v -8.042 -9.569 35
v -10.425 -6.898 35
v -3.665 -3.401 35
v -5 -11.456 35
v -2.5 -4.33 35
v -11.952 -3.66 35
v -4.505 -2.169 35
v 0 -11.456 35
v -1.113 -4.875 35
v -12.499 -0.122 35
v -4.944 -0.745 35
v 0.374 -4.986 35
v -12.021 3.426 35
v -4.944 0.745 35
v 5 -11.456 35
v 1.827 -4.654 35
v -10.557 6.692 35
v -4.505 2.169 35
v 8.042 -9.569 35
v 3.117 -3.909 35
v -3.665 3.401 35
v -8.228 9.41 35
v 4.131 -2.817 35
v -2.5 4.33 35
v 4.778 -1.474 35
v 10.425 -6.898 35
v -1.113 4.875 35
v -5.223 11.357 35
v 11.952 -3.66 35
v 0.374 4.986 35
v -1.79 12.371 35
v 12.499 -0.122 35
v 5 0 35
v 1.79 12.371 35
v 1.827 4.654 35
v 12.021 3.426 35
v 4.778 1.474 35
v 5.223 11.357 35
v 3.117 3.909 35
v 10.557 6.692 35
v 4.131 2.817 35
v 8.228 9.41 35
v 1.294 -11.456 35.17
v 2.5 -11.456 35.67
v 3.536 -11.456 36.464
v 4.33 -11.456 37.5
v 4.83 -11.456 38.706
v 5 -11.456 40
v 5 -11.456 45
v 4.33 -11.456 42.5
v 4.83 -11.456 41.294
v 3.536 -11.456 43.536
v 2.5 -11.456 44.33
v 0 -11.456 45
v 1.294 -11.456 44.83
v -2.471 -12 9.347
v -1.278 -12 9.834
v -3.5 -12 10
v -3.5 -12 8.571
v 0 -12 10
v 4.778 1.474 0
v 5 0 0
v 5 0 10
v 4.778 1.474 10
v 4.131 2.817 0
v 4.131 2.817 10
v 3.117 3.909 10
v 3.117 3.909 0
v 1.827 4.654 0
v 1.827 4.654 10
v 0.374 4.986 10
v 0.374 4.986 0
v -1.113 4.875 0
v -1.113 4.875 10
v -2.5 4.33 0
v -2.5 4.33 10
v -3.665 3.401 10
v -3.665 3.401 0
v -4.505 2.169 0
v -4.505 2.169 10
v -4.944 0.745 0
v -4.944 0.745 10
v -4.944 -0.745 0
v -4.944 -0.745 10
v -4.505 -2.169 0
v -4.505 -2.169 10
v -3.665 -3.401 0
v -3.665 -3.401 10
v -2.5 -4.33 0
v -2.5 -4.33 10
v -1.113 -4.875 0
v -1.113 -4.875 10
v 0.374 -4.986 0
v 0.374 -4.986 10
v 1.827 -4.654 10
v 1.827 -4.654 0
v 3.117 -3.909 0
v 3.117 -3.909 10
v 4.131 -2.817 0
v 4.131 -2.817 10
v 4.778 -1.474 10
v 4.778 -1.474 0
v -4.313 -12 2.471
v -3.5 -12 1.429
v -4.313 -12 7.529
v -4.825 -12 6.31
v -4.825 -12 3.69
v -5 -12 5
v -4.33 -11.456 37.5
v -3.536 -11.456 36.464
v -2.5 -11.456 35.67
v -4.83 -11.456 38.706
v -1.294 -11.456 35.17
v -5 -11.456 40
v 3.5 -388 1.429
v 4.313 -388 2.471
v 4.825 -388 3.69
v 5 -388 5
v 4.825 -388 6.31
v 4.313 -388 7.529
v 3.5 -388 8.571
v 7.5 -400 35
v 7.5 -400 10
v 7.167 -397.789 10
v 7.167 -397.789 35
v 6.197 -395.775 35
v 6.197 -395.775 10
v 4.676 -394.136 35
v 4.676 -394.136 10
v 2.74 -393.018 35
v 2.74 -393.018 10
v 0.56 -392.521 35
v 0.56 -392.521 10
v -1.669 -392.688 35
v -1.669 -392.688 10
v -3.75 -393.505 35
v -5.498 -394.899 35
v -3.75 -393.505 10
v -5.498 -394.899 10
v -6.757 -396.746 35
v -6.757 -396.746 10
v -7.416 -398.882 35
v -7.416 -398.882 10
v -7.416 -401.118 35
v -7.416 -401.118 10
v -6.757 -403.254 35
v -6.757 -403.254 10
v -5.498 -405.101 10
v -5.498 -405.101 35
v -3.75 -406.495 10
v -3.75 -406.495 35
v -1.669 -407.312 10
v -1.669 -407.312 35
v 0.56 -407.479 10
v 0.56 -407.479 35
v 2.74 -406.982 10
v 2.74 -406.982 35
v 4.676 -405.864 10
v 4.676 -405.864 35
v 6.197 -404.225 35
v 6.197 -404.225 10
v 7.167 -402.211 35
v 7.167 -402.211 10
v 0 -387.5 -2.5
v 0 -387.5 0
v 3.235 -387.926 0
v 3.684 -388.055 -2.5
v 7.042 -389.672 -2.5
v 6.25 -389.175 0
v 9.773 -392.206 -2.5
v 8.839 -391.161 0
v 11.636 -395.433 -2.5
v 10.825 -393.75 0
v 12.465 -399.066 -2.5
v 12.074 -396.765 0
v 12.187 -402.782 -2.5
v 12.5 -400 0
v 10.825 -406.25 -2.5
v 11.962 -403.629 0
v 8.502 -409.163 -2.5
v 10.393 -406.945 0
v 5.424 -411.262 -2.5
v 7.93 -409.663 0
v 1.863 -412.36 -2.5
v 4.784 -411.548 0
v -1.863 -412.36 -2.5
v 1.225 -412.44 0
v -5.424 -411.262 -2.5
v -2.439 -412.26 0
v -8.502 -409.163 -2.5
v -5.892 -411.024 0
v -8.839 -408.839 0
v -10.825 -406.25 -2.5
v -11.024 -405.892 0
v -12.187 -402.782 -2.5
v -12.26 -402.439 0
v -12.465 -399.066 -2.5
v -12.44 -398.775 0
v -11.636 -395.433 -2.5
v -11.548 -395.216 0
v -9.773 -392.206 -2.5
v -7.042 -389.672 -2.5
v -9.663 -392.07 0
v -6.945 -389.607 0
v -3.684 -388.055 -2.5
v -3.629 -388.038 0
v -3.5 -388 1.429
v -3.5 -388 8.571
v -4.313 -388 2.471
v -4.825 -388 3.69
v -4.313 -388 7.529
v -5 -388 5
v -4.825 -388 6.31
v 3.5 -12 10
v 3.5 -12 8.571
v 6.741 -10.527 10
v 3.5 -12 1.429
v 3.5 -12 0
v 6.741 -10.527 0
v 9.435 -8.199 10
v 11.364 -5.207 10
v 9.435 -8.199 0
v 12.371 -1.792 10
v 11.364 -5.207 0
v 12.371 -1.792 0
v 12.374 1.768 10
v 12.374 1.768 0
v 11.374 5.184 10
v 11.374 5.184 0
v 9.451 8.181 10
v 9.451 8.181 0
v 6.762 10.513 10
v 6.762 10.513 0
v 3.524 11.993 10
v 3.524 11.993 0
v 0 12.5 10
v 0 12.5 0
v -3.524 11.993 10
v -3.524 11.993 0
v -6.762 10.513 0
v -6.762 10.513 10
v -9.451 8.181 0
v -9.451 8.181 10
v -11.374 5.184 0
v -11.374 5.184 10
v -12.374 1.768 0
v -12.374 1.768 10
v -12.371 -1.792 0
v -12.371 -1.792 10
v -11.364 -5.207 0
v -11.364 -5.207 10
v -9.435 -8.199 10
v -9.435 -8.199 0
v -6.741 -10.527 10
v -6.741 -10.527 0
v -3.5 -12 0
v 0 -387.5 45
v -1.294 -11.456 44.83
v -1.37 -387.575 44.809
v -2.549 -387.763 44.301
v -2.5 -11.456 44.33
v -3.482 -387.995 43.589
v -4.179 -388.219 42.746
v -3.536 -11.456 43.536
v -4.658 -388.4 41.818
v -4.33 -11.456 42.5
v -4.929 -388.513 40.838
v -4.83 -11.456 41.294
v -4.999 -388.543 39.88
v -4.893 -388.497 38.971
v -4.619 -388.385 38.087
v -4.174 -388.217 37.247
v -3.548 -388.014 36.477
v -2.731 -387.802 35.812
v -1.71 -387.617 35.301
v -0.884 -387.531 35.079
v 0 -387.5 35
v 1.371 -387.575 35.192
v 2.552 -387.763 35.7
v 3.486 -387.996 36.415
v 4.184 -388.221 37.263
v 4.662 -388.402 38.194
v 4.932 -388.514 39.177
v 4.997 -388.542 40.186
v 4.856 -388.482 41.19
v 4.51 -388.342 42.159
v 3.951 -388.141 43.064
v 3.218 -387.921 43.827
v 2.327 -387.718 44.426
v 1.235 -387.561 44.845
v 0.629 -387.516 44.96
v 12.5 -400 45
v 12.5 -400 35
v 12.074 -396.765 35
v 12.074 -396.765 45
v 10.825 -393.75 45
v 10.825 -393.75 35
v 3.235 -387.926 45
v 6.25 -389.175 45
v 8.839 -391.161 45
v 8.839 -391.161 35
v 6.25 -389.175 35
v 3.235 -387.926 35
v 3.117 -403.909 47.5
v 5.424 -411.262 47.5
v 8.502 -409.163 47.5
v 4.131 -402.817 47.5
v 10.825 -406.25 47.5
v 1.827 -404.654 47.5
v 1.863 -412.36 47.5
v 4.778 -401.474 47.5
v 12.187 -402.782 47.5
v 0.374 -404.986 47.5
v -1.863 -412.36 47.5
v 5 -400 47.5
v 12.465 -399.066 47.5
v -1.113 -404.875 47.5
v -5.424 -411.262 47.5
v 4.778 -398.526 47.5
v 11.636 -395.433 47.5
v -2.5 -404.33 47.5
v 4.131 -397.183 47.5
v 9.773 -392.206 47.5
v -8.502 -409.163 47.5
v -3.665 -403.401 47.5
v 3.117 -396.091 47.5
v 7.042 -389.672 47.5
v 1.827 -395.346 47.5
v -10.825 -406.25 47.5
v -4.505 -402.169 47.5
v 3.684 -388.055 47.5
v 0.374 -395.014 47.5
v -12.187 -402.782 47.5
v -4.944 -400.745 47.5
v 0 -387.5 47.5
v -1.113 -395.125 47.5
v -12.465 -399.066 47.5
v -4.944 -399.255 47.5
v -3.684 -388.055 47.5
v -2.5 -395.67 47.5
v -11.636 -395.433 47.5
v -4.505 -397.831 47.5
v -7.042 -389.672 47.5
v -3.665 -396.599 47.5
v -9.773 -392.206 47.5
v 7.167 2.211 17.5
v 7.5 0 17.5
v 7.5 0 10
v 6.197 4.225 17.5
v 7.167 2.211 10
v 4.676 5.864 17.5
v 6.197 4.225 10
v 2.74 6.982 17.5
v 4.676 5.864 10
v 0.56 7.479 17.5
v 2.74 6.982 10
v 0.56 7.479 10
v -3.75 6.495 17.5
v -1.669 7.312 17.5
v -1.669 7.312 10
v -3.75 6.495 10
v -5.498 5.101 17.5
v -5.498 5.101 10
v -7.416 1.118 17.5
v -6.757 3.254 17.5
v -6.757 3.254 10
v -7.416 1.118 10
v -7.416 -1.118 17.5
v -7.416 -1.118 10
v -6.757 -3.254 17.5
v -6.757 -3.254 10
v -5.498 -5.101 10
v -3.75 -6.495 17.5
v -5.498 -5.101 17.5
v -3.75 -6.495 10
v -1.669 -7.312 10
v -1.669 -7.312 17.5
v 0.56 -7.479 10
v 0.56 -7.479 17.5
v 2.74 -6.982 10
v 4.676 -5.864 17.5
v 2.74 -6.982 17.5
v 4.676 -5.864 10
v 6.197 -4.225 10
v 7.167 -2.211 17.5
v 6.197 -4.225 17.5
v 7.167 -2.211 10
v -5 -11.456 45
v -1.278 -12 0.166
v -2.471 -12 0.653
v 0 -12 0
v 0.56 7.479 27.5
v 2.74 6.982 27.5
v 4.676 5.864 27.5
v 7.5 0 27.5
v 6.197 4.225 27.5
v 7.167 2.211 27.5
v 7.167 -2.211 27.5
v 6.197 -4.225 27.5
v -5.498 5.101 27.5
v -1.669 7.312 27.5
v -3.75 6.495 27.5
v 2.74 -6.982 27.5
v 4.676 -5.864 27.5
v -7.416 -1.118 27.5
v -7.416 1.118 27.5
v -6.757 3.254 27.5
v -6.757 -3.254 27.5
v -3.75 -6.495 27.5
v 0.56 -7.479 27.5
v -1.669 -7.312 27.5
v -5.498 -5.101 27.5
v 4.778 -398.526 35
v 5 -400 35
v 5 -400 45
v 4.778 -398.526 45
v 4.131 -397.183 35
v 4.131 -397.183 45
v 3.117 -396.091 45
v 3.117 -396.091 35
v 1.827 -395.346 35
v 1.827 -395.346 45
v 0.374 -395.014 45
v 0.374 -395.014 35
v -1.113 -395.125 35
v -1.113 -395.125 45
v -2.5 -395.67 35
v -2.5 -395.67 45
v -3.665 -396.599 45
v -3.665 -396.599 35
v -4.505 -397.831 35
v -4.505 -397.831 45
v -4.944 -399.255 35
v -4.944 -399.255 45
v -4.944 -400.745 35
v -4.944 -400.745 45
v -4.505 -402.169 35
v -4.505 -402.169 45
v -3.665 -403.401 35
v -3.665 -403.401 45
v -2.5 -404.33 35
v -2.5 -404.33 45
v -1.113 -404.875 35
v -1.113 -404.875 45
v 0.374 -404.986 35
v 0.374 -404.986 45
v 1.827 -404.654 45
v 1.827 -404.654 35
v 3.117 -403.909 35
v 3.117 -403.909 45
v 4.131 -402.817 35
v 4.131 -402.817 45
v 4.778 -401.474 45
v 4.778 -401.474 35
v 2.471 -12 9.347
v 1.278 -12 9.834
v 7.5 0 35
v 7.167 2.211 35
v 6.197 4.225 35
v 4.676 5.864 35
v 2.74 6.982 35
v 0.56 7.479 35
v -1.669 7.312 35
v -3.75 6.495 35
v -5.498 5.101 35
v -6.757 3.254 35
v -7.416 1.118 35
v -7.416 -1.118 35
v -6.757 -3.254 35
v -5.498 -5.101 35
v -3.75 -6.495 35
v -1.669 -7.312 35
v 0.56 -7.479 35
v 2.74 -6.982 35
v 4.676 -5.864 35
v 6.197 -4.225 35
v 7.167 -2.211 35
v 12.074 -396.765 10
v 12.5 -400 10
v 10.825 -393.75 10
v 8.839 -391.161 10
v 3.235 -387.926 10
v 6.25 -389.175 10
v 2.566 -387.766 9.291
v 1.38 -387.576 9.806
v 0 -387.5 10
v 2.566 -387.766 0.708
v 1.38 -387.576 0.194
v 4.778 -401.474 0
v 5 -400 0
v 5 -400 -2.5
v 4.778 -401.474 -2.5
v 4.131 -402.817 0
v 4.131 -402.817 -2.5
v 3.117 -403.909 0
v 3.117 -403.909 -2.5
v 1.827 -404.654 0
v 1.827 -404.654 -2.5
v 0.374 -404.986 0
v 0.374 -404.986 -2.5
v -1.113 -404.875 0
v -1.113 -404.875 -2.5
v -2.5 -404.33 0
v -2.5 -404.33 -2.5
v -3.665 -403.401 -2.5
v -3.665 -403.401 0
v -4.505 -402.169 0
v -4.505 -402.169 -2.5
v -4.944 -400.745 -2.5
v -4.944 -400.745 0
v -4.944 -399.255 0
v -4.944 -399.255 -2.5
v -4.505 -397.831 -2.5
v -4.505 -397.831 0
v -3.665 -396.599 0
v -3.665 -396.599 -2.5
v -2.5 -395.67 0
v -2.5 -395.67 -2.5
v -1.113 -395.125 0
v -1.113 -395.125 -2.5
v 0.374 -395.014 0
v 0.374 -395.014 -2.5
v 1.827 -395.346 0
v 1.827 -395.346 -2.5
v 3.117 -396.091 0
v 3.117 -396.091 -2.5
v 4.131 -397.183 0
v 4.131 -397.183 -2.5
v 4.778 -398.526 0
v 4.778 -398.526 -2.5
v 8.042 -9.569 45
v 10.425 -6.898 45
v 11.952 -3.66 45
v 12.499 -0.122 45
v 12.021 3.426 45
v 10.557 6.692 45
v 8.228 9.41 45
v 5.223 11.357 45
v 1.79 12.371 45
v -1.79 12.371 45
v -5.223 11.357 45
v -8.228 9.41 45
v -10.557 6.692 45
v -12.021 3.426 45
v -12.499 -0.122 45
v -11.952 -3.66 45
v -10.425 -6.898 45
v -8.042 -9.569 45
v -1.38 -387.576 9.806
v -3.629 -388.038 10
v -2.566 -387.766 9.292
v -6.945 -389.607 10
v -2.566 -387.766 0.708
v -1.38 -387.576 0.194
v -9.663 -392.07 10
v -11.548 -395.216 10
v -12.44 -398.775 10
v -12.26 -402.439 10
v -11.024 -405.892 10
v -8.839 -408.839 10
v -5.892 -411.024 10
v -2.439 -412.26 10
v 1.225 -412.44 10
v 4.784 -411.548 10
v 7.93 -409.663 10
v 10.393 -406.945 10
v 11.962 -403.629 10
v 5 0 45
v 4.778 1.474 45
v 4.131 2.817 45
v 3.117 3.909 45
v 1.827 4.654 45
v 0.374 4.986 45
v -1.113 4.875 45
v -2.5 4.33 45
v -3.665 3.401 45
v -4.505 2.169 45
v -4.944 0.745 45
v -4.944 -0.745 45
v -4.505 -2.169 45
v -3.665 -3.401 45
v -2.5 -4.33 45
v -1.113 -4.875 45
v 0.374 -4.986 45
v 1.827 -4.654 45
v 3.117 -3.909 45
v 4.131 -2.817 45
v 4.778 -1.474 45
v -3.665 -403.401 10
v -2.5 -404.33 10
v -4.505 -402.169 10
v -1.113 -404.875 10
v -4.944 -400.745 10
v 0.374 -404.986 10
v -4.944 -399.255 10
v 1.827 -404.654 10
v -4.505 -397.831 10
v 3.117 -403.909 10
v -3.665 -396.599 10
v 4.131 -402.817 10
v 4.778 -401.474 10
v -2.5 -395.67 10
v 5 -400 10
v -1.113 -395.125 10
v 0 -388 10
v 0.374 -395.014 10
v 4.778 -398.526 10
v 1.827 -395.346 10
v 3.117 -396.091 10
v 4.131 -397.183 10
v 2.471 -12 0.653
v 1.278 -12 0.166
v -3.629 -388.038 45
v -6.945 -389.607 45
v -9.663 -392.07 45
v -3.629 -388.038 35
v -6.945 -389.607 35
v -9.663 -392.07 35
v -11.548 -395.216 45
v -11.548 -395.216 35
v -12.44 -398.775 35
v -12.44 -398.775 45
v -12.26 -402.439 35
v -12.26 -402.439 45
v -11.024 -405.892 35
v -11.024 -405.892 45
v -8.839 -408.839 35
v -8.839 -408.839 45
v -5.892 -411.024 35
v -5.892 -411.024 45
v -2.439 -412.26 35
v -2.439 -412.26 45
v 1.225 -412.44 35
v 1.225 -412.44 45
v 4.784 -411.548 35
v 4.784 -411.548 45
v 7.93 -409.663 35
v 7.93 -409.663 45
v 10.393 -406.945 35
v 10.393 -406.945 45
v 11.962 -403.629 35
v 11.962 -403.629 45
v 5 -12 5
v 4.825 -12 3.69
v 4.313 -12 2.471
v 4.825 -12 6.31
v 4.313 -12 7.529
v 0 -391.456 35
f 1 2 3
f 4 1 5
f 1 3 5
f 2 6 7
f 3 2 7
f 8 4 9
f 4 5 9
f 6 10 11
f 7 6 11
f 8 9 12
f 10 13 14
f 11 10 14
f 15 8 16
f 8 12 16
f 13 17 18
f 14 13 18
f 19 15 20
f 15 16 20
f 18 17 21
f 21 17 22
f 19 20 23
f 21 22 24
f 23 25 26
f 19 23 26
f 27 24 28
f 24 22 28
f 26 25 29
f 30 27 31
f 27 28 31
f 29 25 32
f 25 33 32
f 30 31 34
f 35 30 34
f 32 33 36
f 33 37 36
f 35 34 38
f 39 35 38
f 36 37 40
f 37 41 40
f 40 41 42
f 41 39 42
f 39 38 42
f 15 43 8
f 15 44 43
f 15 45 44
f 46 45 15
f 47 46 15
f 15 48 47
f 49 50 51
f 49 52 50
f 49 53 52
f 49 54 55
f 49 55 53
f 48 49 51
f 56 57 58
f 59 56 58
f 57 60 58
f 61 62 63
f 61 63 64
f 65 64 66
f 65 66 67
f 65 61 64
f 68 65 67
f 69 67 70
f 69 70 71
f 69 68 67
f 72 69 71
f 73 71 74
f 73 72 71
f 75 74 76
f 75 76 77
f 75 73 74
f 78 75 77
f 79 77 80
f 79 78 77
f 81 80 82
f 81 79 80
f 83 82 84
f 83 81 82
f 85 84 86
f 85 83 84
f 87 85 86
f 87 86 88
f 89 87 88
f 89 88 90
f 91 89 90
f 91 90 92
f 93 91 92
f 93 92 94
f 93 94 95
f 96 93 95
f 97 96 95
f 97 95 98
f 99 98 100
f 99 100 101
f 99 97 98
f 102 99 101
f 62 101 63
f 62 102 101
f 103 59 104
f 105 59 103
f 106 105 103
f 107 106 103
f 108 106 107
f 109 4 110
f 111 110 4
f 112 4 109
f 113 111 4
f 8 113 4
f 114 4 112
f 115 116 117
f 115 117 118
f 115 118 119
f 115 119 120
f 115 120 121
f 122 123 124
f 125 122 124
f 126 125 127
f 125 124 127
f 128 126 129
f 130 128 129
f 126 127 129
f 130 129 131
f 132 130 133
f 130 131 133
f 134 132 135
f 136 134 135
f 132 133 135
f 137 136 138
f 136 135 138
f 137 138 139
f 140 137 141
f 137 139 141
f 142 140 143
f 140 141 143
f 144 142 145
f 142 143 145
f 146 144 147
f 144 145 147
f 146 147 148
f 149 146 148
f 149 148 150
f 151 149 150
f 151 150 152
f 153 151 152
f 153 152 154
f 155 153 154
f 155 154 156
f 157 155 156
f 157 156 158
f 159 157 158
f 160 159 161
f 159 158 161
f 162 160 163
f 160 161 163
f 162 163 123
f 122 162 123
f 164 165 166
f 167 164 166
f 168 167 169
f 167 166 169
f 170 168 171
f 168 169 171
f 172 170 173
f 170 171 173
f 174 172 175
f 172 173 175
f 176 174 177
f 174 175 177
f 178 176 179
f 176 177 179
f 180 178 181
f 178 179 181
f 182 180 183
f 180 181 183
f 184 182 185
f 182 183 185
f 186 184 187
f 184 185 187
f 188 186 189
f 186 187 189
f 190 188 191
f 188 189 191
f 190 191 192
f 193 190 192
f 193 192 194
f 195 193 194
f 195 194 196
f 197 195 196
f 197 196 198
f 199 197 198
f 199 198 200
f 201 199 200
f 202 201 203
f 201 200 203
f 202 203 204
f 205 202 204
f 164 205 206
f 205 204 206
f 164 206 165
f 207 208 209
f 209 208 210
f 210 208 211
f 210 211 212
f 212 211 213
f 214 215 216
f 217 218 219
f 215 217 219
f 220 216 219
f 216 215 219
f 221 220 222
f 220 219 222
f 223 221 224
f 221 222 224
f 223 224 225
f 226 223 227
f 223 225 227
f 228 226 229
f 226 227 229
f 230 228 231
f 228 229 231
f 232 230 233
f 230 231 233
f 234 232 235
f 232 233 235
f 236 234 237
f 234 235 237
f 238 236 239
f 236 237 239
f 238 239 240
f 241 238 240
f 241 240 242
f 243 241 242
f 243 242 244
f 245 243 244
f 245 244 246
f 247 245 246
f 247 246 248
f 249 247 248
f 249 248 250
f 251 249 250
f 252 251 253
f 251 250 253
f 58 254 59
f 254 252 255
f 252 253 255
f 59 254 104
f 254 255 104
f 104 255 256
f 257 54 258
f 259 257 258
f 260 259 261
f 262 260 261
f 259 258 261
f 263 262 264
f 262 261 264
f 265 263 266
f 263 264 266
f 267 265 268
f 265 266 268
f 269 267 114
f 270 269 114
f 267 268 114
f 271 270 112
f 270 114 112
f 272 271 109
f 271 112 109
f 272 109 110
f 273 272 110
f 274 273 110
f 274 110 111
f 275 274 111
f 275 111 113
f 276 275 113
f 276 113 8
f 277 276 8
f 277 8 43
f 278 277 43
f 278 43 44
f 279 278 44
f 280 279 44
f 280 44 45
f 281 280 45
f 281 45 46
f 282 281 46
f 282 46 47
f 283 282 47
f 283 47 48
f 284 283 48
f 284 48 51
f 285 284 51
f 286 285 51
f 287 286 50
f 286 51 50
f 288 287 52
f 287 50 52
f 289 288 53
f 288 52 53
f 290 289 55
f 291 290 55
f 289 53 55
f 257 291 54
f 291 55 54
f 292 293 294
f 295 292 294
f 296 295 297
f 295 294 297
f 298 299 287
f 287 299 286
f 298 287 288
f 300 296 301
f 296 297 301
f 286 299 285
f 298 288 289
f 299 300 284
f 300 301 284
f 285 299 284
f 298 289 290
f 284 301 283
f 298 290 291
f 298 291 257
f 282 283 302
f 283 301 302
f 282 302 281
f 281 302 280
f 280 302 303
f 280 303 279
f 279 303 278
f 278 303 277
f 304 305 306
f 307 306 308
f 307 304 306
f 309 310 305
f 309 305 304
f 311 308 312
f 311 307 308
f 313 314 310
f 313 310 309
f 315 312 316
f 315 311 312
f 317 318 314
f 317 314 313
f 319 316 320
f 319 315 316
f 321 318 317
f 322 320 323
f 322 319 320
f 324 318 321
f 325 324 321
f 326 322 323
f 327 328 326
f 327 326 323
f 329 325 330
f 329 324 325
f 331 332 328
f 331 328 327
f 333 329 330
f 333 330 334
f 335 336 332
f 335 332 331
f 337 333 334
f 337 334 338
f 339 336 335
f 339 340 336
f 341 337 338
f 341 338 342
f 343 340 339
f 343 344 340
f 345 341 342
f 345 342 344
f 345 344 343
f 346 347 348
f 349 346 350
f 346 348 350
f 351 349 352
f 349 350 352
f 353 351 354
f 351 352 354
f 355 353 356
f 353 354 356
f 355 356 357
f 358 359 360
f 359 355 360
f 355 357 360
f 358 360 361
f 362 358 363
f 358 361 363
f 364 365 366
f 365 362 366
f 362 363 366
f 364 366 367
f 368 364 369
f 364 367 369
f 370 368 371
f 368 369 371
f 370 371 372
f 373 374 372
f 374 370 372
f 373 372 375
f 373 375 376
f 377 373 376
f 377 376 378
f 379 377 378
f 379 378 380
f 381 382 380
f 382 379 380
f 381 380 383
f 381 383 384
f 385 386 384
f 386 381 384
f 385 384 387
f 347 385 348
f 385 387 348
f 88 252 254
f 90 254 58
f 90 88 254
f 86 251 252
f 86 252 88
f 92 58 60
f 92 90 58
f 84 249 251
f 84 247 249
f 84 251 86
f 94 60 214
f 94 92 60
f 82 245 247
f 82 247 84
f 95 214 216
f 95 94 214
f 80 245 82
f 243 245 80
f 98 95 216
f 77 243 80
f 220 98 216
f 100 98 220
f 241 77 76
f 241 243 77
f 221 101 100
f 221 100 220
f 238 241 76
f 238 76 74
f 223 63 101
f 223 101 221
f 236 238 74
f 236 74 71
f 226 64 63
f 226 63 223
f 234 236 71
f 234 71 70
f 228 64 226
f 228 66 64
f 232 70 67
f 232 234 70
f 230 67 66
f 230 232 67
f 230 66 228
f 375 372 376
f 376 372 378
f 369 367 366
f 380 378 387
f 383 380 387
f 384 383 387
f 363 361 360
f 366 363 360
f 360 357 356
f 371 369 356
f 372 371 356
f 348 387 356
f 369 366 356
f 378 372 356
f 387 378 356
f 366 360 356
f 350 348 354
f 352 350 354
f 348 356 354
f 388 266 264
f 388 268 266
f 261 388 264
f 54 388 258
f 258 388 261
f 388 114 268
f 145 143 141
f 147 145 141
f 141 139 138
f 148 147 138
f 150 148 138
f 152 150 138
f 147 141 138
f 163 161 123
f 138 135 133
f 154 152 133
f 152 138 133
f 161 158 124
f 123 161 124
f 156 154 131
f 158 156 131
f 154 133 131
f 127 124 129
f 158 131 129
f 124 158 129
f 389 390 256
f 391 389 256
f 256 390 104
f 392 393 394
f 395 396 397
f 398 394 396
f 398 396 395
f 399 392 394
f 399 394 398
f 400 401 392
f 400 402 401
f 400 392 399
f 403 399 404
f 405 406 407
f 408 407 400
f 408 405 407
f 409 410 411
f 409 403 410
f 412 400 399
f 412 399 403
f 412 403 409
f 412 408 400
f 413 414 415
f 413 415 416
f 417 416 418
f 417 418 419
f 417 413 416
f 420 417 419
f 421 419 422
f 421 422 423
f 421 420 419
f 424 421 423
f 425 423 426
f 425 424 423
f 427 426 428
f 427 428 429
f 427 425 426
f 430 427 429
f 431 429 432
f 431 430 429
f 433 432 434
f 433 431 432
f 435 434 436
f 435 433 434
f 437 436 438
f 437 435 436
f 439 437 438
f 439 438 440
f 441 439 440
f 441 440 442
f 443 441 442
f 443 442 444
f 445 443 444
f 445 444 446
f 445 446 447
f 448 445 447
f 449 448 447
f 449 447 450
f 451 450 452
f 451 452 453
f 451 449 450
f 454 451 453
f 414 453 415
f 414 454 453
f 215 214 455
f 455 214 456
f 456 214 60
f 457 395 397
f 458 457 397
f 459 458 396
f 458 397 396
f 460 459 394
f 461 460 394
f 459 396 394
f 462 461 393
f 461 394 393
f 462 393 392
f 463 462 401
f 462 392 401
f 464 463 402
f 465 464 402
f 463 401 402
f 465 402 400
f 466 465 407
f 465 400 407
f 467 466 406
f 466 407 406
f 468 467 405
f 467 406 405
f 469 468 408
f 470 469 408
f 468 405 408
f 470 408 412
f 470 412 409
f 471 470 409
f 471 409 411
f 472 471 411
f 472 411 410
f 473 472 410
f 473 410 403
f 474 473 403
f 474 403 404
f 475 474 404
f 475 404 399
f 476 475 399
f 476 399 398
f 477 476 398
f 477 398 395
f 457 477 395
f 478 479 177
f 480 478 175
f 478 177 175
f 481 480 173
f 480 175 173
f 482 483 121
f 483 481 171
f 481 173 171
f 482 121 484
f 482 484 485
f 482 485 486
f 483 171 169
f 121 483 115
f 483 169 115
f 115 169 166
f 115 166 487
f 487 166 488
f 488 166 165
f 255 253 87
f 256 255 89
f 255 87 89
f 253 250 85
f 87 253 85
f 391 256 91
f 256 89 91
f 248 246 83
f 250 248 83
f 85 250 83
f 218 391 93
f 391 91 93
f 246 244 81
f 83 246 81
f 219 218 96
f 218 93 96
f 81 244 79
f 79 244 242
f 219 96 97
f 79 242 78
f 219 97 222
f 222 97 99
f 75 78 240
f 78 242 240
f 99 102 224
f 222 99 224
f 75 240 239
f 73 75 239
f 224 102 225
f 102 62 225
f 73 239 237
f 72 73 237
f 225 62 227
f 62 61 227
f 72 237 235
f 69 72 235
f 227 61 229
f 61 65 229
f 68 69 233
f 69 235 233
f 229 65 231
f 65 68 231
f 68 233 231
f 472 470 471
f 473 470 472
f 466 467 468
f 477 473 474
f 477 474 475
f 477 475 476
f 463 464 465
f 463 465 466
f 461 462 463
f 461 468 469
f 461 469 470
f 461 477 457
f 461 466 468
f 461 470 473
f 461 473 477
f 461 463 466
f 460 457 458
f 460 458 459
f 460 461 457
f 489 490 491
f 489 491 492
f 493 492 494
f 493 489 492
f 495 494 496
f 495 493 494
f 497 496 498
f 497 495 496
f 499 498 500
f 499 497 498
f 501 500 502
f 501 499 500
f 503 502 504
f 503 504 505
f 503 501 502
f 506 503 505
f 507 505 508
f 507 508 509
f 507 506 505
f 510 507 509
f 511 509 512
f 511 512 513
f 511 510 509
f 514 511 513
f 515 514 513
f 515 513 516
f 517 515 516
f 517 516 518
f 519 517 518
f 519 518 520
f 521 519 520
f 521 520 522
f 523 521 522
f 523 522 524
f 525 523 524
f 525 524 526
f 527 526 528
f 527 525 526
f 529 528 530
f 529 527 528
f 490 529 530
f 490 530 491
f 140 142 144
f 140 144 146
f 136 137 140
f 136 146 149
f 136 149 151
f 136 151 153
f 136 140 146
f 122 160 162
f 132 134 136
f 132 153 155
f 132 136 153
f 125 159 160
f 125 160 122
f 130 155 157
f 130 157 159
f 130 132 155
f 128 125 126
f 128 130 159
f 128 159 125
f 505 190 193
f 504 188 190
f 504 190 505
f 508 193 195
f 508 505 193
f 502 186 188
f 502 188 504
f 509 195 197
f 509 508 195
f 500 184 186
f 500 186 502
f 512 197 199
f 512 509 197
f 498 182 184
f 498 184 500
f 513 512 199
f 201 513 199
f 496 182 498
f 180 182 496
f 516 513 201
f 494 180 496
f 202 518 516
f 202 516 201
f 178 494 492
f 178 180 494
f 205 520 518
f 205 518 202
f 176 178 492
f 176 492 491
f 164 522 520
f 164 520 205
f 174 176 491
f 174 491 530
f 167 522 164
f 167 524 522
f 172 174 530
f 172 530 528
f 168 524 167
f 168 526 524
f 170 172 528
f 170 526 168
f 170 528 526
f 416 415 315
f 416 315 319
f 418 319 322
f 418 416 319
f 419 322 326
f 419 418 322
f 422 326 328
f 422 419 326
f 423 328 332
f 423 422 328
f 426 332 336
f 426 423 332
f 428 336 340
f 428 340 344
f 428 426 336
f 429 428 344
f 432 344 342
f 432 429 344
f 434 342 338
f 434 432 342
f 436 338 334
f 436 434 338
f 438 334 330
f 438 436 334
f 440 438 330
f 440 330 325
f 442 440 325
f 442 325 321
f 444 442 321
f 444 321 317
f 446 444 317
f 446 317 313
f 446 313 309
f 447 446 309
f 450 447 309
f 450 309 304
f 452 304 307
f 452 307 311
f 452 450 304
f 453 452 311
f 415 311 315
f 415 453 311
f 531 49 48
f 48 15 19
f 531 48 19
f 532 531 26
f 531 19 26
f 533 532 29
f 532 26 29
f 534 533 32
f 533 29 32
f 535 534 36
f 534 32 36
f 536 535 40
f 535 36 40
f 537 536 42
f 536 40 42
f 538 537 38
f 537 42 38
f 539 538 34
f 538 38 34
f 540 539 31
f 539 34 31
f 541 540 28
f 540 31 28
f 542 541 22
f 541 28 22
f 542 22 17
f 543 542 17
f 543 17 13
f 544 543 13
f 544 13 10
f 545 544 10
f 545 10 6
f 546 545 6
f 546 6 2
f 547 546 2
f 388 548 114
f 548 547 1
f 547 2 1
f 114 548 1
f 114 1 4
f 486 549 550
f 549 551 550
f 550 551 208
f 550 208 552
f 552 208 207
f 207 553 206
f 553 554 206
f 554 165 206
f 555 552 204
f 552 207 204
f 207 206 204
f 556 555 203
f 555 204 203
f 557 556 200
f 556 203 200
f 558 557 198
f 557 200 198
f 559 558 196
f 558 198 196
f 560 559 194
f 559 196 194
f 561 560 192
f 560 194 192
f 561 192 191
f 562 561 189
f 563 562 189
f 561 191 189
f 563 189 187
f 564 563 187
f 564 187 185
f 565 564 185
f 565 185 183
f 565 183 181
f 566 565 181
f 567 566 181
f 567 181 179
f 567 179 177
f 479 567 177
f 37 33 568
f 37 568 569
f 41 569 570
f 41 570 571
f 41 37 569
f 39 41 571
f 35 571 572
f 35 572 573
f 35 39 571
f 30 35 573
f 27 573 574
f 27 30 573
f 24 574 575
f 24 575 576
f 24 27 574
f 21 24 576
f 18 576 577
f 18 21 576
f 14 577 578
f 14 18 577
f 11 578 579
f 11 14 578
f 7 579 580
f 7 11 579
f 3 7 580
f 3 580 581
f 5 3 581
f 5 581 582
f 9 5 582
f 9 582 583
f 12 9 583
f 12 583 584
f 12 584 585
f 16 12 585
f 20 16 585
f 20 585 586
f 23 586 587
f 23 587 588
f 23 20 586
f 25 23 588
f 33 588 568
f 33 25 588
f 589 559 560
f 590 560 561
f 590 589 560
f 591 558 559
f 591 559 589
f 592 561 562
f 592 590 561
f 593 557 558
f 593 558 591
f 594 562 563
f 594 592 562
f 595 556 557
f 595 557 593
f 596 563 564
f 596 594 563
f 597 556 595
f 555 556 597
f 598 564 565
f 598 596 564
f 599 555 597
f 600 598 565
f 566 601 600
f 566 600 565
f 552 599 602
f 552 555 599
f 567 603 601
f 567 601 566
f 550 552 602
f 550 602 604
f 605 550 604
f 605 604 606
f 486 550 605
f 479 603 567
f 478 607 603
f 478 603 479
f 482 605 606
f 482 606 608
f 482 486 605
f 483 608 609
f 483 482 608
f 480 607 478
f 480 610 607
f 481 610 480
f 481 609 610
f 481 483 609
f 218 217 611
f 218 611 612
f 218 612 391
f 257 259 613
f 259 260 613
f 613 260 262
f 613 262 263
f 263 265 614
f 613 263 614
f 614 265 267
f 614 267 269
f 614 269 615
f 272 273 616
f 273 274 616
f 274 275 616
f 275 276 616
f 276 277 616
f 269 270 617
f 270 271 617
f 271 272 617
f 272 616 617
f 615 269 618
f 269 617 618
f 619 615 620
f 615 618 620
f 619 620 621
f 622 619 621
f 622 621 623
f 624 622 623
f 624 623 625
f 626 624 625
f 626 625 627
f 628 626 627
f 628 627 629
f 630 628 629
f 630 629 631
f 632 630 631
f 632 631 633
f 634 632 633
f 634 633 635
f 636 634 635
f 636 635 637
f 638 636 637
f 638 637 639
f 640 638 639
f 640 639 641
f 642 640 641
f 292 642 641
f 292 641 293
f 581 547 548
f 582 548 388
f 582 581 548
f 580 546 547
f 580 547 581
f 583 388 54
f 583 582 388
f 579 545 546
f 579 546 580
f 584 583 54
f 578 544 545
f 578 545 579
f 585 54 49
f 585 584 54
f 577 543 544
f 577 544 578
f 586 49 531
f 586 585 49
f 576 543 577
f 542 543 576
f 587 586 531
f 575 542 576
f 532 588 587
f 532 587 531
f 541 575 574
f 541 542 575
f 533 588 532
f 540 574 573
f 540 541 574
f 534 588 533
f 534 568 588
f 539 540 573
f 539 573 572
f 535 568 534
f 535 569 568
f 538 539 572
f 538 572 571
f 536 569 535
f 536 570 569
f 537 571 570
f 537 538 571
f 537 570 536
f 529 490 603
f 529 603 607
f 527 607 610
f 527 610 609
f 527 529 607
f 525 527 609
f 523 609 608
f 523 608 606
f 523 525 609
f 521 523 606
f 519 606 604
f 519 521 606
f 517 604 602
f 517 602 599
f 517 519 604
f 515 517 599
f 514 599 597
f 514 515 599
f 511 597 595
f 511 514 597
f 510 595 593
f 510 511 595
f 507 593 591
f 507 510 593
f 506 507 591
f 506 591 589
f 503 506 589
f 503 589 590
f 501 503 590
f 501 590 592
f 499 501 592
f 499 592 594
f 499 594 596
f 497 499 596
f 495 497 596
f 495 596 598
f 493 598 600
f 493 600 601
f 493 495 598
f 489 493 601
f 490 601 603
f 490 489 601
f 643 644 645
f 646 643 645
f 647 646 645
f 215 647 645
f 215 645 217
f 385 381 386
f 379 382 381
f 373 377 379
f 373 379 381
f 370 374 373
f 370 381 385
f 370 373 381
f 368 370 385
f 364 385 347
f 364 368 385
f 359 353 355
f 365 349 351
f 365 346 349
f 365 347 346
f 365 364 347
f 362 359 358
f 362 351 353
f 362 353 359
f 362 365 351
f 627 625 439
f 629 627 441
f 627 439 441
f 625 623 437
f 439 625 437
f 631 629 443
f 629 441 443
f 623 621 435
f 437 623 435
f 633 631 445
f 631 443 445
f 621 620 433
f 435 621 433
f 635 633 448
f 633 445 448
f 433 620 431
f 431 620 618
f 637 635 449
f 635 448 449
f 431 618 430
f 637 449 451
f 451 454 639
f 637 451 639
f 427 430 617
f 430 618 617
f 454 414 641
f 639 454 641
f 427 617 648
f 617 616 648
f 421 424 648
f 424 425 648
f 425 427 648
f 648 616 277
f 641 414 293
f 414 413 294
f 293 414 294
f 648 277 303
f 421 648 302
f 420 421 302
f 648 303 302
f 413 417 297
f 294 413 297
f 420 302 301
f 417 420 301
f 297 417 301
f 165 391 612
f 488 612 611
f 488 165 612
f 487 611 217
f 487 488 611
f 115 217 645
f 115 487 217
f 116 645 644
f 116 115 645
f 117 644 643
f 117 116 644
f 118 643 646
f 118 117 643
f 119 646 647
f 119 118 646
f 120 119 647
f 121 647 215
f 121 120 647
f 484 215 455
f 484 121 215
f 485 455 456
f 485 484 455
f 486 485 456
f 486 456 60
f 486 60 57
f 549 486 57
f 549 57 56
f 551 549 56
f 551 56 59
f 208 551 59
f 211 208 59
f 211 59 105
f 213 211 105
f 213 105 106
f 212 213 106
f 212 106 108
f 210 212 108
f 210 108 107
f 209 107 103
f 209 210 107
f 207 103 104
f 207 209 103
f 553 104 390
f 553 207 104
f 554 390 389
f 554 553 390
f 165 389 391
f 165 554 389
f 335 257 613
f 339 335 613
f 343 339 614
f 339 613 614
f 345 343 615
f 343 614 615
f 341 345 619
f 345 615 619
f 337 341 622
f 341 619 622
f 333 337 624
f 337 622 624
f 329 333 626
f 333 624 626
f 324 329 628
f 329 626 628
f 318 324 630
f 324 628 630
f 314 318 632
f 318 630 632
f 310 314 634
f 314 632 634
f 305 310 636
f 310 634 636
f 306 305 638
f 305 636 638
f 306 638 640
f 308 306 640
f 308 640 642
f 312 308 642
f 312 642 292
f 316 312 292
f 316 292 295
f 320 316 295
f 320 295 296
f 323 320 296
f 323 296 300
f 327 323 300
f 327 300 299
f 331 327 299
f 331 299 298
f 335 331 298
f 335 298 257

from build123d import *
from build123d.topology import SkipClean

# Parameters (mm, degrees)
SKETCH1_R               = 12.5
SKETCH1_R_2             = 5
BOSS_EXTRUDE1_DEPTH     = 10
CUT_EXTRUDE2_DEPTH      = 21.310096012
SKETCH3_R               = 5
BOSS_EXTRUDE2_DEPTH     = 188
SKETCH5_R               = 12.5
SKETCH5_R_2             = 5
BOSS_EXTRUDE4_DEPTH     = 10
SKETCH7_R               = 7.5
BOSS_EXTRUDE5_DEPTH     = 25
BOSS_EXTRUDE5_2_DEPTH   = 25
SKETCH8_R               = 12.5
SKETCH8_R_2             = 5
BOSS_EXTRUDE6_DEPTH     = 10
BOSS_EXTRUDE6_2_DEPTH   = 10
CUT_EXTRUDE3_DEPTH      = 20
SKETCH12_R              = 5
BOSS_EXTRUDE8_DEPTH     = 380
CUT_EXTRUDE4_DEPTH      = 416.135520155
CUT_EXTRUDE4_DEPTH_BACK = 416.135520155
SKETCH14_R              = 12.5
SKETCH14_R_2            = 5
BOSS_EXTRUDE9_DEPTH     = 2.5
SKETCH15_R              = 12.5
SKETCH15_R_2            = 5
BOSS_EXTRUDE10_DEPTH    = 2.5


with BuildPart() as part:
    # Sketch1 → Boss-Extrude1 (new body)
    with BuildSketch(Plane.XY):
        Circle(SKETCH1_R)
        Circle(SKETCH1_R_2, mode=Mode.SUBTRACT)
    extrude(amount=BOSS_EXTRUDE1_DEPTH)

    # Sketch2 → Cut-Extrude2 (cut, through all)
    with BuildSketch(Plane.XY.offset(10)):
        with BuildLine():
            Line((9.108105184, -12), (3.5, -12))
            ThreePointArc((3.5, -12), (0, -12.5), (-3.5, -12))
            Line((-3.5, -12), (-7.494861462, -12))
            Line((-7.494861462, -12), (-7.494861462, -13.628548532))
            Line((-7.494861462, -13.628548532), (9.511416115, -13.628548532))
            Line((9.511416115, -13.628548532), (9.108105184, -12))
        make_face()
        with BuildLine():
            Line((3.5, -12), (0, -12))
            Line((0, -12), (-3.5, -12))
            ThreePointArc((-3.5, -12), (0, -12.5), (3.5, -12))
        make_face()
    extrude(amount=-CUT_EXTRUDE2_DEPTH, mode=Mode.SUBTRACT)

    # Sketch3 → Boss-Extrude2 (add)
    with BuildSketch(Plane(origin=(0, -12, 0), x_dir=(-1, 0, 0), z_dir=(0, -1, 0))):
        with Locations(Location((0, -5, 0), (0, 0, 90))):
            Circle(SKETCH3_R)
    boss_extrude2 = extrude(amount=BOSS_EXTRUDE2_DEPTH)

    # Mirror2: Boss-Extrude2 across plane
    add(boss_extrude2.mirror(Plane(origin=(0, -200, 5), x_dir=(0, 0, 1), z_dir=(0, -1, 0))))

    # Sketch5 → Boss-Extrude4 (add)
    with SkipClean():  # the faces are left unmerged after this step: merging them gives an invalid solid
        with BuildSketch(Plane.XY):
            with Locations((0, -400)):
                Circle(SKETCH5_R)
            with Locations((0, -400)):
                Circle(SKETCH5_R_2, mode=Mode.SUBTRACT)
        extrude(amount=BOSS_EXTRUDE4_DEPTH)

    # Sketch15 → Boss-Extrude10 (add)
    with SkipClean():  # the faces are left unmerged after this step: merging them gives an invalid solid
        with BuildSketch(Plane(origin=(0, 0, 0), x_dir=(-1, 0, 0), z_dir=(0, 0, -1))):
            with Locations(Location((0, -400, 0), (0, 0, 90))):
                Circle(SKETCH15_R)
            with Locations(Location((0, -400, 0), (0, 0, 180))):
                Circle(SKETCH15_R_2, mode=Mode.SUBTRACT)
        extrude(amount=BOSS_EXTRUDE10_DEPTH)


with BuildPart() as body_2:
    # Sketch7 → Boss-Extrude5 (new body)
    with BuildSketch(Plane.XY.offset(10)):
        Circle(SKETCH7_R)
    extrude(amount=BOSS_EXTRUDE5_DEPTH)

    # Sketch13 → Cut-Extrude4 (cut, two sides)
    with BuildSketch(Plane(origin=(0, 0, 0), x_dir=(0, 0, -1), z_dir=(1, 0, 0))) as cut_extrude4_sk:
        Polygon((-17.5, 7.5), (-22.5, 7.5), (-27.5, 7.5), (-27.5, -15.803446393), (-17.5, -15.803446393), align=None)
    extrude(amount=CUT_EXTRUDE4_DEPTH, mode=Mode.SUBTRACT)
    extrude(cut_extrude4_sk.sketch, amount=-CUT_EXTRUDE4_DEPTH_BACK, mode=Mode.SUBTRACT)


with BuildPart() as body_3:
    # Sketch7 → Boss-Extrude5 2 (new body)
    with BuildSketch(Plane.XY.offset(10)):
        with Locations((0, -400)):
            Circle(SKETCH7_R)
    extrude(amount=BOSS_EXTRUDE5_2_DEPTH)


with BuildPart() as body_4:
    # Sketch8 → Boss-Extrude6 (new body)
    with BuildSketch(Plane.XY.offset(35)):
        Circle(SKETCH8_R)
        Circle(SKETCH8_R_2, mode=Mode.SUBTRACT)
    extrude(amount=BOSS_EXTRUDE6_DEPTH)

    # Sketch9 → Cut-Extrude3 (cut)
    with BuildSketch(Plane.XY.offset(45)):
        Polygon((-5, -12), (-5, -11.456439237), (5, -11.456439237), (5, -13.442017523), align=None)
    extrude(amount=-CUT_EXTRUDE3_DEPTH, mode=Mode.SUBTRACT)



with BuildPart() as body_5:
    # Sketch8 → Boss-Extrude6 2 (new body)
    with BuildSketch(Plane.XY.offset(35)):
        with Locations((0, -400)):
            Circle(SKETCH8_R)
        with Locations((0, -400)):
            Circle(SKETCH8_R_2, mode=Mode.SUBTRACT)
    extrude(amount=BOSS_EXTRUDE6_2_DEPTH)


with BuildPart() as body_4_1:
    with SkipClean():  # the faces are left unmerged after this step: merging them gives an invalid solid
        add(body_4.part)

        add(body_5.part)  # Boss-Extrude8 merges body 5
        # Sketch12 → Boss-Extrude8 (add)
        with BuildSketch(Plane(origin=(0, -11.456439237, 0), x_dir=(-1, 0, 0), z_dir=(0, -1, 0))):
            with Locations(Location((0, -40, 0), (0, 0, 270))):
                Circle(SKETCH12_R)
        extrude(amount=BOSS_EXTRUDE8_DEPTH)

    # Sketch14 → Boss-Extrude9 (add)
    with SkipClean():  # the faces are left unmerged after this step: merging them gives an invalid solid
        with BuildSketch(Plane.XY.offset(45)):
            with Locations(Location((0, -400, 0), (0, 0, 90))):
                Circle(SKETCH14_R)
            with Locations((0, -400)):
                Circle(SKETCH14_R_2, mode=Mode.SUBTRACT)
        extrude(amount=BOSS_EXTRUDE9_DEPTH)


with BuildPart() as cut_extrude4_piece_1:
    # of the separate pieces the step leaves, piece 1, a body of its own (cut_extrude4_pieces)
    add(body_2.part.solids().sort_by_distance((7.5, 0, 10))[0])


with BuildPart() as cut_extrude4_piece_2:
    # of the separate pieces the step leaves, piece 2, a body of its own (cut_extrude4_pieces)
    add(body_2.part.solids().sort_by_distance((7.5, 0, 27.5))[0])


solid = Compound([part.part, body_3.part, body_4_1.part, cut_extrude4_piece_1.part, cut_extrude4_piece_2.part])
